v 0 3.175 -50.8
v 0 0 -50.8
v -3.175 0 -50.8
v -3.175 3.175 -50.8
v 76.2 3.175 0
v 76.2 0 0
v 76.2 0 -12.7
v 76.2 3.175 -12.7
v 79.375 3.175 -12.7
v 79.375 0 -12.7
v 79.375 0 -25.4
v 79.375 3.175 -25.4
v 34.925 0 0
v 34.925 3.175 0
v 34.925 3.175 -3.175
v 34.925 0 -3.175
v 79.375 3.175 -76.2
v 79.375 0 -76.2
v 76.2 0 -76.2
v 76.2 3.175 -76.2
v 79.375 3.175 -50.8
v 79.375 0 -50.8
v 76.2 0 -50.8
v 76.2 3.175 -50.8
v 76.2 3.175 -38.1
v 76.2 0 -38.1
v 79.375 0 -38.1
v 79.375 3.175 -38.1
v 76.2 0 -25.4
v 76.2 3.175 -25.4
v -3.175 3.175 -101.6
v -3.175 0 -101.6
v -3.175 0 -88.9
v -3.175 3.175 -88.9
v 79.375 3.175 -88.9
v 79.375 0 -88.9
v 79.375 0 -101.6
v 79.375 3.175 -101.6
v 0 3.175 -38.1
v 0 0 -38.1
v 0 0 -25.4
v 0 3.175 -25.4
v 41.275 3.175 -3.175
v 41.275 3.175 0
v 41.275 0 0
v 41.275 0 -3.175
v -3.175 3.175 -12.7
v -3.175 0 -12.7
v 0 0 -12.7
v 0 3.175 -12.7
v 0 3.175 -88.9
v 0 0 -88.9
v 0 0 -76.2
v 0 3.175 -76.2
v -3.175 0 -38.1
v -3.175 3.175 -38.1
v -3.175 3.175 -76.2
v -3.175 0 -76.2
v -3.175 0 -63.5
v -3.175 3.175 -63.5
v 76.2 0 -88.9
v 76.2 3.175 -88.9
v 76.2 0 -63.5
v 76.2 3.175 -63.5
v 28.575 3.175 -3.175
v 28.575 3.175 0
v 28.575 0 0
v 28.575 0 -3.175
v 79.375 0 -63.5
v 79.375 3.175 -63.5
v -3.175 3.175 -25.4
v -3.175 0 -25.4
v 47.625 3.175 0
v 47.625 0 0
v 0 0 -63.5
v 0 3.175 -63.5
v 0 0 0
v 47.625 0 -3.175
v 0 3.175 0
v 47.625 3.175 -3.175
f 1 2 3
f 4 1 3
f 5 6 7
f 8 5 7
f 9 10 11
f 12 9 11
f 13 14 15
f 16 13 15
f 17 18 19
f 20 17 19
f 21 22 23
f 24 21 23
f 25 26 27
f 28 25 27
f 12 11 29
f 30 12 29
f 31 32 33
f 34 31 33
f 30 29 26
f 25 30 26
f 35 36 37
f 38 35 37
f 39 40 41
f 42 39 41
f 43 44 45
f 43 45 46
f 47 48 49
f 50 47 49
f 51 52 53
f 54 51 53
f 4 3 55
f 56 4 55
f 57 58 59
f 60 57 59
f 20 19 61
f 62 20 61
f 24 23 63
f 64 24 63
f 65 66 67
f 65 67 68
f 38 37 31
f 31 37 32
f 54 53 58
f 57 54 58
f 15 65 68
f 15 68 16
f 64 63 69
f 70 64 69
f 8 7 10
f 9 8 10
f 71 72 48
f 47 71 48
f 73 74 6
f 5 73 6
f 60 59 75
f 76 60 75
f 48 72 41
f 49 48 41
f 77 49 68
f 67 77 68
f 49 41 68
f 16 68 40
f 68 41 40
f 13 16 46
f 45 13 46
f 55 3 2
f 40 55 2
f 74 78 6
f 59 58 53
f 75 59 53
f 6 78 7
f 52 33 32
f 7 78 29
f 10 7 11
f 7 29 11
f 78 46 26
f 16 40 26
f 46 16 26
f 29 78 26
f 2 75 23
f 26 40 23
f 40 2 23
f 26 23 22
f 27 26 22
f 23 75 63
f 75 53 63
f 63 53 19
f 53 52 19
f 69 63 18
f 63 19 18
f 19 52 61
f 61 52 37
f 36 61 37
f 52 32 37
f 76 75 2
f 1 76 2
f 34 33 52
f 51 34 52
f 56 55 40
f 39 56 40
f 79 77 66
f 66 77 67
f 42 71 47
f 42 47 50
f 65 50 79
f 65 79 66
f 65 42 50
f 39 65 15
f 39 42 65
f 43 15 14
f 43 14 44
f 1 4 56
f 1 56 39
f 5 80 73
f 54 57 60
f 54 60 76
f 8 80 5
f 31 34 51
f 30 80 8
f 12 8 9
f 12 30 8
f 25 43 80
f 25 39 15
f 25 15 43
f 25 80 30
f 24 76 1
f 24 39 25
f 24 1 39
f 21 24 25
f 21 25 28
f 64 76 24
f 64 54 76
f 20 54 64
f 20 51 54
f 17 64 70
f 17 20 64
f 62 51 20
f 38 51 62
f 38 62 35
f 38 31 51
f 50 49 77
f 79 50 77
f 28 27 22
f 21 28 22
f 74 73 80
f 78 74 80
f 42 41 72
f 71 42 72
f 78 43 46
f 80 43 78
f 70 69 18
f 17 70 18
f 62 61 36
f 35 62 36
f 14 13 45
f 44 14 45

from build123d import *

# Parameters (mm, degrees)
BOSS_EXTRUDE1_DEPTH = 3.175
SKETCH2_W           = 6.35
SKETCH2_H           = 3.175
CUT_EXTRUDE1_DEPTH  = 4.175


with BuildPart() as part:
    # Sketch1 → Boss-Extrude1 (new body)
    with BuildSketch(Plane(origin=(0, 0, 0), x_dir=(1, 0, 0), z_dir=(0, 1, 0))):
        Polygon((0, 0), (76.2, 0), (76.2, 12.7), (79.375, 12.7), (79.375, 25.4), (76.2, 25.4), (76.2, 38.1), (79.375, 38.1), (79.375, 50.8), (76.2, 50.8), (76.2, 63.5), (79.375, 63.5), (79.375, 76.2), (76.2, 76.2), (76.2, 88.9), (79.375, 88.9), (79.375, 101.6), (-3.175, 101.6), (-3.175, 88.9), (0, 88.9), (0, 76.2), (-3.175, 76.2), (-3.175, 63.5), (0, 63.5), (0, 50.8), (-3.175, 50.8), (-3.175, 38.1), (0, 38.1), (0, 25.4), (-3.175, 25.4), (-3.175, 12.7), (0, 12.7), align=None)
    extrude(amount=BOSS_EXTRUDE1_DEPTH)

    # Sketch2 → Cut-Extrude1 (cut, through all)
    with BuildSketch(Plane(origin=(0, 3.175, 0), x_dir=(1, 0, 0), z_dir=(0, 1, 0))):
        with Locations((44.45, 1.5875)):
            Rectangle(SKETCH2_W, SKETCH2_H)
        with Locations((31.75, 1.5875)):
            Rectangle(SKETCH2_W, SKETCH2_H)
    extrude(amount=-CUT_EXTRUDE1_DEPTH, mode=Mode.SUBTRACT)


solid = part.part
